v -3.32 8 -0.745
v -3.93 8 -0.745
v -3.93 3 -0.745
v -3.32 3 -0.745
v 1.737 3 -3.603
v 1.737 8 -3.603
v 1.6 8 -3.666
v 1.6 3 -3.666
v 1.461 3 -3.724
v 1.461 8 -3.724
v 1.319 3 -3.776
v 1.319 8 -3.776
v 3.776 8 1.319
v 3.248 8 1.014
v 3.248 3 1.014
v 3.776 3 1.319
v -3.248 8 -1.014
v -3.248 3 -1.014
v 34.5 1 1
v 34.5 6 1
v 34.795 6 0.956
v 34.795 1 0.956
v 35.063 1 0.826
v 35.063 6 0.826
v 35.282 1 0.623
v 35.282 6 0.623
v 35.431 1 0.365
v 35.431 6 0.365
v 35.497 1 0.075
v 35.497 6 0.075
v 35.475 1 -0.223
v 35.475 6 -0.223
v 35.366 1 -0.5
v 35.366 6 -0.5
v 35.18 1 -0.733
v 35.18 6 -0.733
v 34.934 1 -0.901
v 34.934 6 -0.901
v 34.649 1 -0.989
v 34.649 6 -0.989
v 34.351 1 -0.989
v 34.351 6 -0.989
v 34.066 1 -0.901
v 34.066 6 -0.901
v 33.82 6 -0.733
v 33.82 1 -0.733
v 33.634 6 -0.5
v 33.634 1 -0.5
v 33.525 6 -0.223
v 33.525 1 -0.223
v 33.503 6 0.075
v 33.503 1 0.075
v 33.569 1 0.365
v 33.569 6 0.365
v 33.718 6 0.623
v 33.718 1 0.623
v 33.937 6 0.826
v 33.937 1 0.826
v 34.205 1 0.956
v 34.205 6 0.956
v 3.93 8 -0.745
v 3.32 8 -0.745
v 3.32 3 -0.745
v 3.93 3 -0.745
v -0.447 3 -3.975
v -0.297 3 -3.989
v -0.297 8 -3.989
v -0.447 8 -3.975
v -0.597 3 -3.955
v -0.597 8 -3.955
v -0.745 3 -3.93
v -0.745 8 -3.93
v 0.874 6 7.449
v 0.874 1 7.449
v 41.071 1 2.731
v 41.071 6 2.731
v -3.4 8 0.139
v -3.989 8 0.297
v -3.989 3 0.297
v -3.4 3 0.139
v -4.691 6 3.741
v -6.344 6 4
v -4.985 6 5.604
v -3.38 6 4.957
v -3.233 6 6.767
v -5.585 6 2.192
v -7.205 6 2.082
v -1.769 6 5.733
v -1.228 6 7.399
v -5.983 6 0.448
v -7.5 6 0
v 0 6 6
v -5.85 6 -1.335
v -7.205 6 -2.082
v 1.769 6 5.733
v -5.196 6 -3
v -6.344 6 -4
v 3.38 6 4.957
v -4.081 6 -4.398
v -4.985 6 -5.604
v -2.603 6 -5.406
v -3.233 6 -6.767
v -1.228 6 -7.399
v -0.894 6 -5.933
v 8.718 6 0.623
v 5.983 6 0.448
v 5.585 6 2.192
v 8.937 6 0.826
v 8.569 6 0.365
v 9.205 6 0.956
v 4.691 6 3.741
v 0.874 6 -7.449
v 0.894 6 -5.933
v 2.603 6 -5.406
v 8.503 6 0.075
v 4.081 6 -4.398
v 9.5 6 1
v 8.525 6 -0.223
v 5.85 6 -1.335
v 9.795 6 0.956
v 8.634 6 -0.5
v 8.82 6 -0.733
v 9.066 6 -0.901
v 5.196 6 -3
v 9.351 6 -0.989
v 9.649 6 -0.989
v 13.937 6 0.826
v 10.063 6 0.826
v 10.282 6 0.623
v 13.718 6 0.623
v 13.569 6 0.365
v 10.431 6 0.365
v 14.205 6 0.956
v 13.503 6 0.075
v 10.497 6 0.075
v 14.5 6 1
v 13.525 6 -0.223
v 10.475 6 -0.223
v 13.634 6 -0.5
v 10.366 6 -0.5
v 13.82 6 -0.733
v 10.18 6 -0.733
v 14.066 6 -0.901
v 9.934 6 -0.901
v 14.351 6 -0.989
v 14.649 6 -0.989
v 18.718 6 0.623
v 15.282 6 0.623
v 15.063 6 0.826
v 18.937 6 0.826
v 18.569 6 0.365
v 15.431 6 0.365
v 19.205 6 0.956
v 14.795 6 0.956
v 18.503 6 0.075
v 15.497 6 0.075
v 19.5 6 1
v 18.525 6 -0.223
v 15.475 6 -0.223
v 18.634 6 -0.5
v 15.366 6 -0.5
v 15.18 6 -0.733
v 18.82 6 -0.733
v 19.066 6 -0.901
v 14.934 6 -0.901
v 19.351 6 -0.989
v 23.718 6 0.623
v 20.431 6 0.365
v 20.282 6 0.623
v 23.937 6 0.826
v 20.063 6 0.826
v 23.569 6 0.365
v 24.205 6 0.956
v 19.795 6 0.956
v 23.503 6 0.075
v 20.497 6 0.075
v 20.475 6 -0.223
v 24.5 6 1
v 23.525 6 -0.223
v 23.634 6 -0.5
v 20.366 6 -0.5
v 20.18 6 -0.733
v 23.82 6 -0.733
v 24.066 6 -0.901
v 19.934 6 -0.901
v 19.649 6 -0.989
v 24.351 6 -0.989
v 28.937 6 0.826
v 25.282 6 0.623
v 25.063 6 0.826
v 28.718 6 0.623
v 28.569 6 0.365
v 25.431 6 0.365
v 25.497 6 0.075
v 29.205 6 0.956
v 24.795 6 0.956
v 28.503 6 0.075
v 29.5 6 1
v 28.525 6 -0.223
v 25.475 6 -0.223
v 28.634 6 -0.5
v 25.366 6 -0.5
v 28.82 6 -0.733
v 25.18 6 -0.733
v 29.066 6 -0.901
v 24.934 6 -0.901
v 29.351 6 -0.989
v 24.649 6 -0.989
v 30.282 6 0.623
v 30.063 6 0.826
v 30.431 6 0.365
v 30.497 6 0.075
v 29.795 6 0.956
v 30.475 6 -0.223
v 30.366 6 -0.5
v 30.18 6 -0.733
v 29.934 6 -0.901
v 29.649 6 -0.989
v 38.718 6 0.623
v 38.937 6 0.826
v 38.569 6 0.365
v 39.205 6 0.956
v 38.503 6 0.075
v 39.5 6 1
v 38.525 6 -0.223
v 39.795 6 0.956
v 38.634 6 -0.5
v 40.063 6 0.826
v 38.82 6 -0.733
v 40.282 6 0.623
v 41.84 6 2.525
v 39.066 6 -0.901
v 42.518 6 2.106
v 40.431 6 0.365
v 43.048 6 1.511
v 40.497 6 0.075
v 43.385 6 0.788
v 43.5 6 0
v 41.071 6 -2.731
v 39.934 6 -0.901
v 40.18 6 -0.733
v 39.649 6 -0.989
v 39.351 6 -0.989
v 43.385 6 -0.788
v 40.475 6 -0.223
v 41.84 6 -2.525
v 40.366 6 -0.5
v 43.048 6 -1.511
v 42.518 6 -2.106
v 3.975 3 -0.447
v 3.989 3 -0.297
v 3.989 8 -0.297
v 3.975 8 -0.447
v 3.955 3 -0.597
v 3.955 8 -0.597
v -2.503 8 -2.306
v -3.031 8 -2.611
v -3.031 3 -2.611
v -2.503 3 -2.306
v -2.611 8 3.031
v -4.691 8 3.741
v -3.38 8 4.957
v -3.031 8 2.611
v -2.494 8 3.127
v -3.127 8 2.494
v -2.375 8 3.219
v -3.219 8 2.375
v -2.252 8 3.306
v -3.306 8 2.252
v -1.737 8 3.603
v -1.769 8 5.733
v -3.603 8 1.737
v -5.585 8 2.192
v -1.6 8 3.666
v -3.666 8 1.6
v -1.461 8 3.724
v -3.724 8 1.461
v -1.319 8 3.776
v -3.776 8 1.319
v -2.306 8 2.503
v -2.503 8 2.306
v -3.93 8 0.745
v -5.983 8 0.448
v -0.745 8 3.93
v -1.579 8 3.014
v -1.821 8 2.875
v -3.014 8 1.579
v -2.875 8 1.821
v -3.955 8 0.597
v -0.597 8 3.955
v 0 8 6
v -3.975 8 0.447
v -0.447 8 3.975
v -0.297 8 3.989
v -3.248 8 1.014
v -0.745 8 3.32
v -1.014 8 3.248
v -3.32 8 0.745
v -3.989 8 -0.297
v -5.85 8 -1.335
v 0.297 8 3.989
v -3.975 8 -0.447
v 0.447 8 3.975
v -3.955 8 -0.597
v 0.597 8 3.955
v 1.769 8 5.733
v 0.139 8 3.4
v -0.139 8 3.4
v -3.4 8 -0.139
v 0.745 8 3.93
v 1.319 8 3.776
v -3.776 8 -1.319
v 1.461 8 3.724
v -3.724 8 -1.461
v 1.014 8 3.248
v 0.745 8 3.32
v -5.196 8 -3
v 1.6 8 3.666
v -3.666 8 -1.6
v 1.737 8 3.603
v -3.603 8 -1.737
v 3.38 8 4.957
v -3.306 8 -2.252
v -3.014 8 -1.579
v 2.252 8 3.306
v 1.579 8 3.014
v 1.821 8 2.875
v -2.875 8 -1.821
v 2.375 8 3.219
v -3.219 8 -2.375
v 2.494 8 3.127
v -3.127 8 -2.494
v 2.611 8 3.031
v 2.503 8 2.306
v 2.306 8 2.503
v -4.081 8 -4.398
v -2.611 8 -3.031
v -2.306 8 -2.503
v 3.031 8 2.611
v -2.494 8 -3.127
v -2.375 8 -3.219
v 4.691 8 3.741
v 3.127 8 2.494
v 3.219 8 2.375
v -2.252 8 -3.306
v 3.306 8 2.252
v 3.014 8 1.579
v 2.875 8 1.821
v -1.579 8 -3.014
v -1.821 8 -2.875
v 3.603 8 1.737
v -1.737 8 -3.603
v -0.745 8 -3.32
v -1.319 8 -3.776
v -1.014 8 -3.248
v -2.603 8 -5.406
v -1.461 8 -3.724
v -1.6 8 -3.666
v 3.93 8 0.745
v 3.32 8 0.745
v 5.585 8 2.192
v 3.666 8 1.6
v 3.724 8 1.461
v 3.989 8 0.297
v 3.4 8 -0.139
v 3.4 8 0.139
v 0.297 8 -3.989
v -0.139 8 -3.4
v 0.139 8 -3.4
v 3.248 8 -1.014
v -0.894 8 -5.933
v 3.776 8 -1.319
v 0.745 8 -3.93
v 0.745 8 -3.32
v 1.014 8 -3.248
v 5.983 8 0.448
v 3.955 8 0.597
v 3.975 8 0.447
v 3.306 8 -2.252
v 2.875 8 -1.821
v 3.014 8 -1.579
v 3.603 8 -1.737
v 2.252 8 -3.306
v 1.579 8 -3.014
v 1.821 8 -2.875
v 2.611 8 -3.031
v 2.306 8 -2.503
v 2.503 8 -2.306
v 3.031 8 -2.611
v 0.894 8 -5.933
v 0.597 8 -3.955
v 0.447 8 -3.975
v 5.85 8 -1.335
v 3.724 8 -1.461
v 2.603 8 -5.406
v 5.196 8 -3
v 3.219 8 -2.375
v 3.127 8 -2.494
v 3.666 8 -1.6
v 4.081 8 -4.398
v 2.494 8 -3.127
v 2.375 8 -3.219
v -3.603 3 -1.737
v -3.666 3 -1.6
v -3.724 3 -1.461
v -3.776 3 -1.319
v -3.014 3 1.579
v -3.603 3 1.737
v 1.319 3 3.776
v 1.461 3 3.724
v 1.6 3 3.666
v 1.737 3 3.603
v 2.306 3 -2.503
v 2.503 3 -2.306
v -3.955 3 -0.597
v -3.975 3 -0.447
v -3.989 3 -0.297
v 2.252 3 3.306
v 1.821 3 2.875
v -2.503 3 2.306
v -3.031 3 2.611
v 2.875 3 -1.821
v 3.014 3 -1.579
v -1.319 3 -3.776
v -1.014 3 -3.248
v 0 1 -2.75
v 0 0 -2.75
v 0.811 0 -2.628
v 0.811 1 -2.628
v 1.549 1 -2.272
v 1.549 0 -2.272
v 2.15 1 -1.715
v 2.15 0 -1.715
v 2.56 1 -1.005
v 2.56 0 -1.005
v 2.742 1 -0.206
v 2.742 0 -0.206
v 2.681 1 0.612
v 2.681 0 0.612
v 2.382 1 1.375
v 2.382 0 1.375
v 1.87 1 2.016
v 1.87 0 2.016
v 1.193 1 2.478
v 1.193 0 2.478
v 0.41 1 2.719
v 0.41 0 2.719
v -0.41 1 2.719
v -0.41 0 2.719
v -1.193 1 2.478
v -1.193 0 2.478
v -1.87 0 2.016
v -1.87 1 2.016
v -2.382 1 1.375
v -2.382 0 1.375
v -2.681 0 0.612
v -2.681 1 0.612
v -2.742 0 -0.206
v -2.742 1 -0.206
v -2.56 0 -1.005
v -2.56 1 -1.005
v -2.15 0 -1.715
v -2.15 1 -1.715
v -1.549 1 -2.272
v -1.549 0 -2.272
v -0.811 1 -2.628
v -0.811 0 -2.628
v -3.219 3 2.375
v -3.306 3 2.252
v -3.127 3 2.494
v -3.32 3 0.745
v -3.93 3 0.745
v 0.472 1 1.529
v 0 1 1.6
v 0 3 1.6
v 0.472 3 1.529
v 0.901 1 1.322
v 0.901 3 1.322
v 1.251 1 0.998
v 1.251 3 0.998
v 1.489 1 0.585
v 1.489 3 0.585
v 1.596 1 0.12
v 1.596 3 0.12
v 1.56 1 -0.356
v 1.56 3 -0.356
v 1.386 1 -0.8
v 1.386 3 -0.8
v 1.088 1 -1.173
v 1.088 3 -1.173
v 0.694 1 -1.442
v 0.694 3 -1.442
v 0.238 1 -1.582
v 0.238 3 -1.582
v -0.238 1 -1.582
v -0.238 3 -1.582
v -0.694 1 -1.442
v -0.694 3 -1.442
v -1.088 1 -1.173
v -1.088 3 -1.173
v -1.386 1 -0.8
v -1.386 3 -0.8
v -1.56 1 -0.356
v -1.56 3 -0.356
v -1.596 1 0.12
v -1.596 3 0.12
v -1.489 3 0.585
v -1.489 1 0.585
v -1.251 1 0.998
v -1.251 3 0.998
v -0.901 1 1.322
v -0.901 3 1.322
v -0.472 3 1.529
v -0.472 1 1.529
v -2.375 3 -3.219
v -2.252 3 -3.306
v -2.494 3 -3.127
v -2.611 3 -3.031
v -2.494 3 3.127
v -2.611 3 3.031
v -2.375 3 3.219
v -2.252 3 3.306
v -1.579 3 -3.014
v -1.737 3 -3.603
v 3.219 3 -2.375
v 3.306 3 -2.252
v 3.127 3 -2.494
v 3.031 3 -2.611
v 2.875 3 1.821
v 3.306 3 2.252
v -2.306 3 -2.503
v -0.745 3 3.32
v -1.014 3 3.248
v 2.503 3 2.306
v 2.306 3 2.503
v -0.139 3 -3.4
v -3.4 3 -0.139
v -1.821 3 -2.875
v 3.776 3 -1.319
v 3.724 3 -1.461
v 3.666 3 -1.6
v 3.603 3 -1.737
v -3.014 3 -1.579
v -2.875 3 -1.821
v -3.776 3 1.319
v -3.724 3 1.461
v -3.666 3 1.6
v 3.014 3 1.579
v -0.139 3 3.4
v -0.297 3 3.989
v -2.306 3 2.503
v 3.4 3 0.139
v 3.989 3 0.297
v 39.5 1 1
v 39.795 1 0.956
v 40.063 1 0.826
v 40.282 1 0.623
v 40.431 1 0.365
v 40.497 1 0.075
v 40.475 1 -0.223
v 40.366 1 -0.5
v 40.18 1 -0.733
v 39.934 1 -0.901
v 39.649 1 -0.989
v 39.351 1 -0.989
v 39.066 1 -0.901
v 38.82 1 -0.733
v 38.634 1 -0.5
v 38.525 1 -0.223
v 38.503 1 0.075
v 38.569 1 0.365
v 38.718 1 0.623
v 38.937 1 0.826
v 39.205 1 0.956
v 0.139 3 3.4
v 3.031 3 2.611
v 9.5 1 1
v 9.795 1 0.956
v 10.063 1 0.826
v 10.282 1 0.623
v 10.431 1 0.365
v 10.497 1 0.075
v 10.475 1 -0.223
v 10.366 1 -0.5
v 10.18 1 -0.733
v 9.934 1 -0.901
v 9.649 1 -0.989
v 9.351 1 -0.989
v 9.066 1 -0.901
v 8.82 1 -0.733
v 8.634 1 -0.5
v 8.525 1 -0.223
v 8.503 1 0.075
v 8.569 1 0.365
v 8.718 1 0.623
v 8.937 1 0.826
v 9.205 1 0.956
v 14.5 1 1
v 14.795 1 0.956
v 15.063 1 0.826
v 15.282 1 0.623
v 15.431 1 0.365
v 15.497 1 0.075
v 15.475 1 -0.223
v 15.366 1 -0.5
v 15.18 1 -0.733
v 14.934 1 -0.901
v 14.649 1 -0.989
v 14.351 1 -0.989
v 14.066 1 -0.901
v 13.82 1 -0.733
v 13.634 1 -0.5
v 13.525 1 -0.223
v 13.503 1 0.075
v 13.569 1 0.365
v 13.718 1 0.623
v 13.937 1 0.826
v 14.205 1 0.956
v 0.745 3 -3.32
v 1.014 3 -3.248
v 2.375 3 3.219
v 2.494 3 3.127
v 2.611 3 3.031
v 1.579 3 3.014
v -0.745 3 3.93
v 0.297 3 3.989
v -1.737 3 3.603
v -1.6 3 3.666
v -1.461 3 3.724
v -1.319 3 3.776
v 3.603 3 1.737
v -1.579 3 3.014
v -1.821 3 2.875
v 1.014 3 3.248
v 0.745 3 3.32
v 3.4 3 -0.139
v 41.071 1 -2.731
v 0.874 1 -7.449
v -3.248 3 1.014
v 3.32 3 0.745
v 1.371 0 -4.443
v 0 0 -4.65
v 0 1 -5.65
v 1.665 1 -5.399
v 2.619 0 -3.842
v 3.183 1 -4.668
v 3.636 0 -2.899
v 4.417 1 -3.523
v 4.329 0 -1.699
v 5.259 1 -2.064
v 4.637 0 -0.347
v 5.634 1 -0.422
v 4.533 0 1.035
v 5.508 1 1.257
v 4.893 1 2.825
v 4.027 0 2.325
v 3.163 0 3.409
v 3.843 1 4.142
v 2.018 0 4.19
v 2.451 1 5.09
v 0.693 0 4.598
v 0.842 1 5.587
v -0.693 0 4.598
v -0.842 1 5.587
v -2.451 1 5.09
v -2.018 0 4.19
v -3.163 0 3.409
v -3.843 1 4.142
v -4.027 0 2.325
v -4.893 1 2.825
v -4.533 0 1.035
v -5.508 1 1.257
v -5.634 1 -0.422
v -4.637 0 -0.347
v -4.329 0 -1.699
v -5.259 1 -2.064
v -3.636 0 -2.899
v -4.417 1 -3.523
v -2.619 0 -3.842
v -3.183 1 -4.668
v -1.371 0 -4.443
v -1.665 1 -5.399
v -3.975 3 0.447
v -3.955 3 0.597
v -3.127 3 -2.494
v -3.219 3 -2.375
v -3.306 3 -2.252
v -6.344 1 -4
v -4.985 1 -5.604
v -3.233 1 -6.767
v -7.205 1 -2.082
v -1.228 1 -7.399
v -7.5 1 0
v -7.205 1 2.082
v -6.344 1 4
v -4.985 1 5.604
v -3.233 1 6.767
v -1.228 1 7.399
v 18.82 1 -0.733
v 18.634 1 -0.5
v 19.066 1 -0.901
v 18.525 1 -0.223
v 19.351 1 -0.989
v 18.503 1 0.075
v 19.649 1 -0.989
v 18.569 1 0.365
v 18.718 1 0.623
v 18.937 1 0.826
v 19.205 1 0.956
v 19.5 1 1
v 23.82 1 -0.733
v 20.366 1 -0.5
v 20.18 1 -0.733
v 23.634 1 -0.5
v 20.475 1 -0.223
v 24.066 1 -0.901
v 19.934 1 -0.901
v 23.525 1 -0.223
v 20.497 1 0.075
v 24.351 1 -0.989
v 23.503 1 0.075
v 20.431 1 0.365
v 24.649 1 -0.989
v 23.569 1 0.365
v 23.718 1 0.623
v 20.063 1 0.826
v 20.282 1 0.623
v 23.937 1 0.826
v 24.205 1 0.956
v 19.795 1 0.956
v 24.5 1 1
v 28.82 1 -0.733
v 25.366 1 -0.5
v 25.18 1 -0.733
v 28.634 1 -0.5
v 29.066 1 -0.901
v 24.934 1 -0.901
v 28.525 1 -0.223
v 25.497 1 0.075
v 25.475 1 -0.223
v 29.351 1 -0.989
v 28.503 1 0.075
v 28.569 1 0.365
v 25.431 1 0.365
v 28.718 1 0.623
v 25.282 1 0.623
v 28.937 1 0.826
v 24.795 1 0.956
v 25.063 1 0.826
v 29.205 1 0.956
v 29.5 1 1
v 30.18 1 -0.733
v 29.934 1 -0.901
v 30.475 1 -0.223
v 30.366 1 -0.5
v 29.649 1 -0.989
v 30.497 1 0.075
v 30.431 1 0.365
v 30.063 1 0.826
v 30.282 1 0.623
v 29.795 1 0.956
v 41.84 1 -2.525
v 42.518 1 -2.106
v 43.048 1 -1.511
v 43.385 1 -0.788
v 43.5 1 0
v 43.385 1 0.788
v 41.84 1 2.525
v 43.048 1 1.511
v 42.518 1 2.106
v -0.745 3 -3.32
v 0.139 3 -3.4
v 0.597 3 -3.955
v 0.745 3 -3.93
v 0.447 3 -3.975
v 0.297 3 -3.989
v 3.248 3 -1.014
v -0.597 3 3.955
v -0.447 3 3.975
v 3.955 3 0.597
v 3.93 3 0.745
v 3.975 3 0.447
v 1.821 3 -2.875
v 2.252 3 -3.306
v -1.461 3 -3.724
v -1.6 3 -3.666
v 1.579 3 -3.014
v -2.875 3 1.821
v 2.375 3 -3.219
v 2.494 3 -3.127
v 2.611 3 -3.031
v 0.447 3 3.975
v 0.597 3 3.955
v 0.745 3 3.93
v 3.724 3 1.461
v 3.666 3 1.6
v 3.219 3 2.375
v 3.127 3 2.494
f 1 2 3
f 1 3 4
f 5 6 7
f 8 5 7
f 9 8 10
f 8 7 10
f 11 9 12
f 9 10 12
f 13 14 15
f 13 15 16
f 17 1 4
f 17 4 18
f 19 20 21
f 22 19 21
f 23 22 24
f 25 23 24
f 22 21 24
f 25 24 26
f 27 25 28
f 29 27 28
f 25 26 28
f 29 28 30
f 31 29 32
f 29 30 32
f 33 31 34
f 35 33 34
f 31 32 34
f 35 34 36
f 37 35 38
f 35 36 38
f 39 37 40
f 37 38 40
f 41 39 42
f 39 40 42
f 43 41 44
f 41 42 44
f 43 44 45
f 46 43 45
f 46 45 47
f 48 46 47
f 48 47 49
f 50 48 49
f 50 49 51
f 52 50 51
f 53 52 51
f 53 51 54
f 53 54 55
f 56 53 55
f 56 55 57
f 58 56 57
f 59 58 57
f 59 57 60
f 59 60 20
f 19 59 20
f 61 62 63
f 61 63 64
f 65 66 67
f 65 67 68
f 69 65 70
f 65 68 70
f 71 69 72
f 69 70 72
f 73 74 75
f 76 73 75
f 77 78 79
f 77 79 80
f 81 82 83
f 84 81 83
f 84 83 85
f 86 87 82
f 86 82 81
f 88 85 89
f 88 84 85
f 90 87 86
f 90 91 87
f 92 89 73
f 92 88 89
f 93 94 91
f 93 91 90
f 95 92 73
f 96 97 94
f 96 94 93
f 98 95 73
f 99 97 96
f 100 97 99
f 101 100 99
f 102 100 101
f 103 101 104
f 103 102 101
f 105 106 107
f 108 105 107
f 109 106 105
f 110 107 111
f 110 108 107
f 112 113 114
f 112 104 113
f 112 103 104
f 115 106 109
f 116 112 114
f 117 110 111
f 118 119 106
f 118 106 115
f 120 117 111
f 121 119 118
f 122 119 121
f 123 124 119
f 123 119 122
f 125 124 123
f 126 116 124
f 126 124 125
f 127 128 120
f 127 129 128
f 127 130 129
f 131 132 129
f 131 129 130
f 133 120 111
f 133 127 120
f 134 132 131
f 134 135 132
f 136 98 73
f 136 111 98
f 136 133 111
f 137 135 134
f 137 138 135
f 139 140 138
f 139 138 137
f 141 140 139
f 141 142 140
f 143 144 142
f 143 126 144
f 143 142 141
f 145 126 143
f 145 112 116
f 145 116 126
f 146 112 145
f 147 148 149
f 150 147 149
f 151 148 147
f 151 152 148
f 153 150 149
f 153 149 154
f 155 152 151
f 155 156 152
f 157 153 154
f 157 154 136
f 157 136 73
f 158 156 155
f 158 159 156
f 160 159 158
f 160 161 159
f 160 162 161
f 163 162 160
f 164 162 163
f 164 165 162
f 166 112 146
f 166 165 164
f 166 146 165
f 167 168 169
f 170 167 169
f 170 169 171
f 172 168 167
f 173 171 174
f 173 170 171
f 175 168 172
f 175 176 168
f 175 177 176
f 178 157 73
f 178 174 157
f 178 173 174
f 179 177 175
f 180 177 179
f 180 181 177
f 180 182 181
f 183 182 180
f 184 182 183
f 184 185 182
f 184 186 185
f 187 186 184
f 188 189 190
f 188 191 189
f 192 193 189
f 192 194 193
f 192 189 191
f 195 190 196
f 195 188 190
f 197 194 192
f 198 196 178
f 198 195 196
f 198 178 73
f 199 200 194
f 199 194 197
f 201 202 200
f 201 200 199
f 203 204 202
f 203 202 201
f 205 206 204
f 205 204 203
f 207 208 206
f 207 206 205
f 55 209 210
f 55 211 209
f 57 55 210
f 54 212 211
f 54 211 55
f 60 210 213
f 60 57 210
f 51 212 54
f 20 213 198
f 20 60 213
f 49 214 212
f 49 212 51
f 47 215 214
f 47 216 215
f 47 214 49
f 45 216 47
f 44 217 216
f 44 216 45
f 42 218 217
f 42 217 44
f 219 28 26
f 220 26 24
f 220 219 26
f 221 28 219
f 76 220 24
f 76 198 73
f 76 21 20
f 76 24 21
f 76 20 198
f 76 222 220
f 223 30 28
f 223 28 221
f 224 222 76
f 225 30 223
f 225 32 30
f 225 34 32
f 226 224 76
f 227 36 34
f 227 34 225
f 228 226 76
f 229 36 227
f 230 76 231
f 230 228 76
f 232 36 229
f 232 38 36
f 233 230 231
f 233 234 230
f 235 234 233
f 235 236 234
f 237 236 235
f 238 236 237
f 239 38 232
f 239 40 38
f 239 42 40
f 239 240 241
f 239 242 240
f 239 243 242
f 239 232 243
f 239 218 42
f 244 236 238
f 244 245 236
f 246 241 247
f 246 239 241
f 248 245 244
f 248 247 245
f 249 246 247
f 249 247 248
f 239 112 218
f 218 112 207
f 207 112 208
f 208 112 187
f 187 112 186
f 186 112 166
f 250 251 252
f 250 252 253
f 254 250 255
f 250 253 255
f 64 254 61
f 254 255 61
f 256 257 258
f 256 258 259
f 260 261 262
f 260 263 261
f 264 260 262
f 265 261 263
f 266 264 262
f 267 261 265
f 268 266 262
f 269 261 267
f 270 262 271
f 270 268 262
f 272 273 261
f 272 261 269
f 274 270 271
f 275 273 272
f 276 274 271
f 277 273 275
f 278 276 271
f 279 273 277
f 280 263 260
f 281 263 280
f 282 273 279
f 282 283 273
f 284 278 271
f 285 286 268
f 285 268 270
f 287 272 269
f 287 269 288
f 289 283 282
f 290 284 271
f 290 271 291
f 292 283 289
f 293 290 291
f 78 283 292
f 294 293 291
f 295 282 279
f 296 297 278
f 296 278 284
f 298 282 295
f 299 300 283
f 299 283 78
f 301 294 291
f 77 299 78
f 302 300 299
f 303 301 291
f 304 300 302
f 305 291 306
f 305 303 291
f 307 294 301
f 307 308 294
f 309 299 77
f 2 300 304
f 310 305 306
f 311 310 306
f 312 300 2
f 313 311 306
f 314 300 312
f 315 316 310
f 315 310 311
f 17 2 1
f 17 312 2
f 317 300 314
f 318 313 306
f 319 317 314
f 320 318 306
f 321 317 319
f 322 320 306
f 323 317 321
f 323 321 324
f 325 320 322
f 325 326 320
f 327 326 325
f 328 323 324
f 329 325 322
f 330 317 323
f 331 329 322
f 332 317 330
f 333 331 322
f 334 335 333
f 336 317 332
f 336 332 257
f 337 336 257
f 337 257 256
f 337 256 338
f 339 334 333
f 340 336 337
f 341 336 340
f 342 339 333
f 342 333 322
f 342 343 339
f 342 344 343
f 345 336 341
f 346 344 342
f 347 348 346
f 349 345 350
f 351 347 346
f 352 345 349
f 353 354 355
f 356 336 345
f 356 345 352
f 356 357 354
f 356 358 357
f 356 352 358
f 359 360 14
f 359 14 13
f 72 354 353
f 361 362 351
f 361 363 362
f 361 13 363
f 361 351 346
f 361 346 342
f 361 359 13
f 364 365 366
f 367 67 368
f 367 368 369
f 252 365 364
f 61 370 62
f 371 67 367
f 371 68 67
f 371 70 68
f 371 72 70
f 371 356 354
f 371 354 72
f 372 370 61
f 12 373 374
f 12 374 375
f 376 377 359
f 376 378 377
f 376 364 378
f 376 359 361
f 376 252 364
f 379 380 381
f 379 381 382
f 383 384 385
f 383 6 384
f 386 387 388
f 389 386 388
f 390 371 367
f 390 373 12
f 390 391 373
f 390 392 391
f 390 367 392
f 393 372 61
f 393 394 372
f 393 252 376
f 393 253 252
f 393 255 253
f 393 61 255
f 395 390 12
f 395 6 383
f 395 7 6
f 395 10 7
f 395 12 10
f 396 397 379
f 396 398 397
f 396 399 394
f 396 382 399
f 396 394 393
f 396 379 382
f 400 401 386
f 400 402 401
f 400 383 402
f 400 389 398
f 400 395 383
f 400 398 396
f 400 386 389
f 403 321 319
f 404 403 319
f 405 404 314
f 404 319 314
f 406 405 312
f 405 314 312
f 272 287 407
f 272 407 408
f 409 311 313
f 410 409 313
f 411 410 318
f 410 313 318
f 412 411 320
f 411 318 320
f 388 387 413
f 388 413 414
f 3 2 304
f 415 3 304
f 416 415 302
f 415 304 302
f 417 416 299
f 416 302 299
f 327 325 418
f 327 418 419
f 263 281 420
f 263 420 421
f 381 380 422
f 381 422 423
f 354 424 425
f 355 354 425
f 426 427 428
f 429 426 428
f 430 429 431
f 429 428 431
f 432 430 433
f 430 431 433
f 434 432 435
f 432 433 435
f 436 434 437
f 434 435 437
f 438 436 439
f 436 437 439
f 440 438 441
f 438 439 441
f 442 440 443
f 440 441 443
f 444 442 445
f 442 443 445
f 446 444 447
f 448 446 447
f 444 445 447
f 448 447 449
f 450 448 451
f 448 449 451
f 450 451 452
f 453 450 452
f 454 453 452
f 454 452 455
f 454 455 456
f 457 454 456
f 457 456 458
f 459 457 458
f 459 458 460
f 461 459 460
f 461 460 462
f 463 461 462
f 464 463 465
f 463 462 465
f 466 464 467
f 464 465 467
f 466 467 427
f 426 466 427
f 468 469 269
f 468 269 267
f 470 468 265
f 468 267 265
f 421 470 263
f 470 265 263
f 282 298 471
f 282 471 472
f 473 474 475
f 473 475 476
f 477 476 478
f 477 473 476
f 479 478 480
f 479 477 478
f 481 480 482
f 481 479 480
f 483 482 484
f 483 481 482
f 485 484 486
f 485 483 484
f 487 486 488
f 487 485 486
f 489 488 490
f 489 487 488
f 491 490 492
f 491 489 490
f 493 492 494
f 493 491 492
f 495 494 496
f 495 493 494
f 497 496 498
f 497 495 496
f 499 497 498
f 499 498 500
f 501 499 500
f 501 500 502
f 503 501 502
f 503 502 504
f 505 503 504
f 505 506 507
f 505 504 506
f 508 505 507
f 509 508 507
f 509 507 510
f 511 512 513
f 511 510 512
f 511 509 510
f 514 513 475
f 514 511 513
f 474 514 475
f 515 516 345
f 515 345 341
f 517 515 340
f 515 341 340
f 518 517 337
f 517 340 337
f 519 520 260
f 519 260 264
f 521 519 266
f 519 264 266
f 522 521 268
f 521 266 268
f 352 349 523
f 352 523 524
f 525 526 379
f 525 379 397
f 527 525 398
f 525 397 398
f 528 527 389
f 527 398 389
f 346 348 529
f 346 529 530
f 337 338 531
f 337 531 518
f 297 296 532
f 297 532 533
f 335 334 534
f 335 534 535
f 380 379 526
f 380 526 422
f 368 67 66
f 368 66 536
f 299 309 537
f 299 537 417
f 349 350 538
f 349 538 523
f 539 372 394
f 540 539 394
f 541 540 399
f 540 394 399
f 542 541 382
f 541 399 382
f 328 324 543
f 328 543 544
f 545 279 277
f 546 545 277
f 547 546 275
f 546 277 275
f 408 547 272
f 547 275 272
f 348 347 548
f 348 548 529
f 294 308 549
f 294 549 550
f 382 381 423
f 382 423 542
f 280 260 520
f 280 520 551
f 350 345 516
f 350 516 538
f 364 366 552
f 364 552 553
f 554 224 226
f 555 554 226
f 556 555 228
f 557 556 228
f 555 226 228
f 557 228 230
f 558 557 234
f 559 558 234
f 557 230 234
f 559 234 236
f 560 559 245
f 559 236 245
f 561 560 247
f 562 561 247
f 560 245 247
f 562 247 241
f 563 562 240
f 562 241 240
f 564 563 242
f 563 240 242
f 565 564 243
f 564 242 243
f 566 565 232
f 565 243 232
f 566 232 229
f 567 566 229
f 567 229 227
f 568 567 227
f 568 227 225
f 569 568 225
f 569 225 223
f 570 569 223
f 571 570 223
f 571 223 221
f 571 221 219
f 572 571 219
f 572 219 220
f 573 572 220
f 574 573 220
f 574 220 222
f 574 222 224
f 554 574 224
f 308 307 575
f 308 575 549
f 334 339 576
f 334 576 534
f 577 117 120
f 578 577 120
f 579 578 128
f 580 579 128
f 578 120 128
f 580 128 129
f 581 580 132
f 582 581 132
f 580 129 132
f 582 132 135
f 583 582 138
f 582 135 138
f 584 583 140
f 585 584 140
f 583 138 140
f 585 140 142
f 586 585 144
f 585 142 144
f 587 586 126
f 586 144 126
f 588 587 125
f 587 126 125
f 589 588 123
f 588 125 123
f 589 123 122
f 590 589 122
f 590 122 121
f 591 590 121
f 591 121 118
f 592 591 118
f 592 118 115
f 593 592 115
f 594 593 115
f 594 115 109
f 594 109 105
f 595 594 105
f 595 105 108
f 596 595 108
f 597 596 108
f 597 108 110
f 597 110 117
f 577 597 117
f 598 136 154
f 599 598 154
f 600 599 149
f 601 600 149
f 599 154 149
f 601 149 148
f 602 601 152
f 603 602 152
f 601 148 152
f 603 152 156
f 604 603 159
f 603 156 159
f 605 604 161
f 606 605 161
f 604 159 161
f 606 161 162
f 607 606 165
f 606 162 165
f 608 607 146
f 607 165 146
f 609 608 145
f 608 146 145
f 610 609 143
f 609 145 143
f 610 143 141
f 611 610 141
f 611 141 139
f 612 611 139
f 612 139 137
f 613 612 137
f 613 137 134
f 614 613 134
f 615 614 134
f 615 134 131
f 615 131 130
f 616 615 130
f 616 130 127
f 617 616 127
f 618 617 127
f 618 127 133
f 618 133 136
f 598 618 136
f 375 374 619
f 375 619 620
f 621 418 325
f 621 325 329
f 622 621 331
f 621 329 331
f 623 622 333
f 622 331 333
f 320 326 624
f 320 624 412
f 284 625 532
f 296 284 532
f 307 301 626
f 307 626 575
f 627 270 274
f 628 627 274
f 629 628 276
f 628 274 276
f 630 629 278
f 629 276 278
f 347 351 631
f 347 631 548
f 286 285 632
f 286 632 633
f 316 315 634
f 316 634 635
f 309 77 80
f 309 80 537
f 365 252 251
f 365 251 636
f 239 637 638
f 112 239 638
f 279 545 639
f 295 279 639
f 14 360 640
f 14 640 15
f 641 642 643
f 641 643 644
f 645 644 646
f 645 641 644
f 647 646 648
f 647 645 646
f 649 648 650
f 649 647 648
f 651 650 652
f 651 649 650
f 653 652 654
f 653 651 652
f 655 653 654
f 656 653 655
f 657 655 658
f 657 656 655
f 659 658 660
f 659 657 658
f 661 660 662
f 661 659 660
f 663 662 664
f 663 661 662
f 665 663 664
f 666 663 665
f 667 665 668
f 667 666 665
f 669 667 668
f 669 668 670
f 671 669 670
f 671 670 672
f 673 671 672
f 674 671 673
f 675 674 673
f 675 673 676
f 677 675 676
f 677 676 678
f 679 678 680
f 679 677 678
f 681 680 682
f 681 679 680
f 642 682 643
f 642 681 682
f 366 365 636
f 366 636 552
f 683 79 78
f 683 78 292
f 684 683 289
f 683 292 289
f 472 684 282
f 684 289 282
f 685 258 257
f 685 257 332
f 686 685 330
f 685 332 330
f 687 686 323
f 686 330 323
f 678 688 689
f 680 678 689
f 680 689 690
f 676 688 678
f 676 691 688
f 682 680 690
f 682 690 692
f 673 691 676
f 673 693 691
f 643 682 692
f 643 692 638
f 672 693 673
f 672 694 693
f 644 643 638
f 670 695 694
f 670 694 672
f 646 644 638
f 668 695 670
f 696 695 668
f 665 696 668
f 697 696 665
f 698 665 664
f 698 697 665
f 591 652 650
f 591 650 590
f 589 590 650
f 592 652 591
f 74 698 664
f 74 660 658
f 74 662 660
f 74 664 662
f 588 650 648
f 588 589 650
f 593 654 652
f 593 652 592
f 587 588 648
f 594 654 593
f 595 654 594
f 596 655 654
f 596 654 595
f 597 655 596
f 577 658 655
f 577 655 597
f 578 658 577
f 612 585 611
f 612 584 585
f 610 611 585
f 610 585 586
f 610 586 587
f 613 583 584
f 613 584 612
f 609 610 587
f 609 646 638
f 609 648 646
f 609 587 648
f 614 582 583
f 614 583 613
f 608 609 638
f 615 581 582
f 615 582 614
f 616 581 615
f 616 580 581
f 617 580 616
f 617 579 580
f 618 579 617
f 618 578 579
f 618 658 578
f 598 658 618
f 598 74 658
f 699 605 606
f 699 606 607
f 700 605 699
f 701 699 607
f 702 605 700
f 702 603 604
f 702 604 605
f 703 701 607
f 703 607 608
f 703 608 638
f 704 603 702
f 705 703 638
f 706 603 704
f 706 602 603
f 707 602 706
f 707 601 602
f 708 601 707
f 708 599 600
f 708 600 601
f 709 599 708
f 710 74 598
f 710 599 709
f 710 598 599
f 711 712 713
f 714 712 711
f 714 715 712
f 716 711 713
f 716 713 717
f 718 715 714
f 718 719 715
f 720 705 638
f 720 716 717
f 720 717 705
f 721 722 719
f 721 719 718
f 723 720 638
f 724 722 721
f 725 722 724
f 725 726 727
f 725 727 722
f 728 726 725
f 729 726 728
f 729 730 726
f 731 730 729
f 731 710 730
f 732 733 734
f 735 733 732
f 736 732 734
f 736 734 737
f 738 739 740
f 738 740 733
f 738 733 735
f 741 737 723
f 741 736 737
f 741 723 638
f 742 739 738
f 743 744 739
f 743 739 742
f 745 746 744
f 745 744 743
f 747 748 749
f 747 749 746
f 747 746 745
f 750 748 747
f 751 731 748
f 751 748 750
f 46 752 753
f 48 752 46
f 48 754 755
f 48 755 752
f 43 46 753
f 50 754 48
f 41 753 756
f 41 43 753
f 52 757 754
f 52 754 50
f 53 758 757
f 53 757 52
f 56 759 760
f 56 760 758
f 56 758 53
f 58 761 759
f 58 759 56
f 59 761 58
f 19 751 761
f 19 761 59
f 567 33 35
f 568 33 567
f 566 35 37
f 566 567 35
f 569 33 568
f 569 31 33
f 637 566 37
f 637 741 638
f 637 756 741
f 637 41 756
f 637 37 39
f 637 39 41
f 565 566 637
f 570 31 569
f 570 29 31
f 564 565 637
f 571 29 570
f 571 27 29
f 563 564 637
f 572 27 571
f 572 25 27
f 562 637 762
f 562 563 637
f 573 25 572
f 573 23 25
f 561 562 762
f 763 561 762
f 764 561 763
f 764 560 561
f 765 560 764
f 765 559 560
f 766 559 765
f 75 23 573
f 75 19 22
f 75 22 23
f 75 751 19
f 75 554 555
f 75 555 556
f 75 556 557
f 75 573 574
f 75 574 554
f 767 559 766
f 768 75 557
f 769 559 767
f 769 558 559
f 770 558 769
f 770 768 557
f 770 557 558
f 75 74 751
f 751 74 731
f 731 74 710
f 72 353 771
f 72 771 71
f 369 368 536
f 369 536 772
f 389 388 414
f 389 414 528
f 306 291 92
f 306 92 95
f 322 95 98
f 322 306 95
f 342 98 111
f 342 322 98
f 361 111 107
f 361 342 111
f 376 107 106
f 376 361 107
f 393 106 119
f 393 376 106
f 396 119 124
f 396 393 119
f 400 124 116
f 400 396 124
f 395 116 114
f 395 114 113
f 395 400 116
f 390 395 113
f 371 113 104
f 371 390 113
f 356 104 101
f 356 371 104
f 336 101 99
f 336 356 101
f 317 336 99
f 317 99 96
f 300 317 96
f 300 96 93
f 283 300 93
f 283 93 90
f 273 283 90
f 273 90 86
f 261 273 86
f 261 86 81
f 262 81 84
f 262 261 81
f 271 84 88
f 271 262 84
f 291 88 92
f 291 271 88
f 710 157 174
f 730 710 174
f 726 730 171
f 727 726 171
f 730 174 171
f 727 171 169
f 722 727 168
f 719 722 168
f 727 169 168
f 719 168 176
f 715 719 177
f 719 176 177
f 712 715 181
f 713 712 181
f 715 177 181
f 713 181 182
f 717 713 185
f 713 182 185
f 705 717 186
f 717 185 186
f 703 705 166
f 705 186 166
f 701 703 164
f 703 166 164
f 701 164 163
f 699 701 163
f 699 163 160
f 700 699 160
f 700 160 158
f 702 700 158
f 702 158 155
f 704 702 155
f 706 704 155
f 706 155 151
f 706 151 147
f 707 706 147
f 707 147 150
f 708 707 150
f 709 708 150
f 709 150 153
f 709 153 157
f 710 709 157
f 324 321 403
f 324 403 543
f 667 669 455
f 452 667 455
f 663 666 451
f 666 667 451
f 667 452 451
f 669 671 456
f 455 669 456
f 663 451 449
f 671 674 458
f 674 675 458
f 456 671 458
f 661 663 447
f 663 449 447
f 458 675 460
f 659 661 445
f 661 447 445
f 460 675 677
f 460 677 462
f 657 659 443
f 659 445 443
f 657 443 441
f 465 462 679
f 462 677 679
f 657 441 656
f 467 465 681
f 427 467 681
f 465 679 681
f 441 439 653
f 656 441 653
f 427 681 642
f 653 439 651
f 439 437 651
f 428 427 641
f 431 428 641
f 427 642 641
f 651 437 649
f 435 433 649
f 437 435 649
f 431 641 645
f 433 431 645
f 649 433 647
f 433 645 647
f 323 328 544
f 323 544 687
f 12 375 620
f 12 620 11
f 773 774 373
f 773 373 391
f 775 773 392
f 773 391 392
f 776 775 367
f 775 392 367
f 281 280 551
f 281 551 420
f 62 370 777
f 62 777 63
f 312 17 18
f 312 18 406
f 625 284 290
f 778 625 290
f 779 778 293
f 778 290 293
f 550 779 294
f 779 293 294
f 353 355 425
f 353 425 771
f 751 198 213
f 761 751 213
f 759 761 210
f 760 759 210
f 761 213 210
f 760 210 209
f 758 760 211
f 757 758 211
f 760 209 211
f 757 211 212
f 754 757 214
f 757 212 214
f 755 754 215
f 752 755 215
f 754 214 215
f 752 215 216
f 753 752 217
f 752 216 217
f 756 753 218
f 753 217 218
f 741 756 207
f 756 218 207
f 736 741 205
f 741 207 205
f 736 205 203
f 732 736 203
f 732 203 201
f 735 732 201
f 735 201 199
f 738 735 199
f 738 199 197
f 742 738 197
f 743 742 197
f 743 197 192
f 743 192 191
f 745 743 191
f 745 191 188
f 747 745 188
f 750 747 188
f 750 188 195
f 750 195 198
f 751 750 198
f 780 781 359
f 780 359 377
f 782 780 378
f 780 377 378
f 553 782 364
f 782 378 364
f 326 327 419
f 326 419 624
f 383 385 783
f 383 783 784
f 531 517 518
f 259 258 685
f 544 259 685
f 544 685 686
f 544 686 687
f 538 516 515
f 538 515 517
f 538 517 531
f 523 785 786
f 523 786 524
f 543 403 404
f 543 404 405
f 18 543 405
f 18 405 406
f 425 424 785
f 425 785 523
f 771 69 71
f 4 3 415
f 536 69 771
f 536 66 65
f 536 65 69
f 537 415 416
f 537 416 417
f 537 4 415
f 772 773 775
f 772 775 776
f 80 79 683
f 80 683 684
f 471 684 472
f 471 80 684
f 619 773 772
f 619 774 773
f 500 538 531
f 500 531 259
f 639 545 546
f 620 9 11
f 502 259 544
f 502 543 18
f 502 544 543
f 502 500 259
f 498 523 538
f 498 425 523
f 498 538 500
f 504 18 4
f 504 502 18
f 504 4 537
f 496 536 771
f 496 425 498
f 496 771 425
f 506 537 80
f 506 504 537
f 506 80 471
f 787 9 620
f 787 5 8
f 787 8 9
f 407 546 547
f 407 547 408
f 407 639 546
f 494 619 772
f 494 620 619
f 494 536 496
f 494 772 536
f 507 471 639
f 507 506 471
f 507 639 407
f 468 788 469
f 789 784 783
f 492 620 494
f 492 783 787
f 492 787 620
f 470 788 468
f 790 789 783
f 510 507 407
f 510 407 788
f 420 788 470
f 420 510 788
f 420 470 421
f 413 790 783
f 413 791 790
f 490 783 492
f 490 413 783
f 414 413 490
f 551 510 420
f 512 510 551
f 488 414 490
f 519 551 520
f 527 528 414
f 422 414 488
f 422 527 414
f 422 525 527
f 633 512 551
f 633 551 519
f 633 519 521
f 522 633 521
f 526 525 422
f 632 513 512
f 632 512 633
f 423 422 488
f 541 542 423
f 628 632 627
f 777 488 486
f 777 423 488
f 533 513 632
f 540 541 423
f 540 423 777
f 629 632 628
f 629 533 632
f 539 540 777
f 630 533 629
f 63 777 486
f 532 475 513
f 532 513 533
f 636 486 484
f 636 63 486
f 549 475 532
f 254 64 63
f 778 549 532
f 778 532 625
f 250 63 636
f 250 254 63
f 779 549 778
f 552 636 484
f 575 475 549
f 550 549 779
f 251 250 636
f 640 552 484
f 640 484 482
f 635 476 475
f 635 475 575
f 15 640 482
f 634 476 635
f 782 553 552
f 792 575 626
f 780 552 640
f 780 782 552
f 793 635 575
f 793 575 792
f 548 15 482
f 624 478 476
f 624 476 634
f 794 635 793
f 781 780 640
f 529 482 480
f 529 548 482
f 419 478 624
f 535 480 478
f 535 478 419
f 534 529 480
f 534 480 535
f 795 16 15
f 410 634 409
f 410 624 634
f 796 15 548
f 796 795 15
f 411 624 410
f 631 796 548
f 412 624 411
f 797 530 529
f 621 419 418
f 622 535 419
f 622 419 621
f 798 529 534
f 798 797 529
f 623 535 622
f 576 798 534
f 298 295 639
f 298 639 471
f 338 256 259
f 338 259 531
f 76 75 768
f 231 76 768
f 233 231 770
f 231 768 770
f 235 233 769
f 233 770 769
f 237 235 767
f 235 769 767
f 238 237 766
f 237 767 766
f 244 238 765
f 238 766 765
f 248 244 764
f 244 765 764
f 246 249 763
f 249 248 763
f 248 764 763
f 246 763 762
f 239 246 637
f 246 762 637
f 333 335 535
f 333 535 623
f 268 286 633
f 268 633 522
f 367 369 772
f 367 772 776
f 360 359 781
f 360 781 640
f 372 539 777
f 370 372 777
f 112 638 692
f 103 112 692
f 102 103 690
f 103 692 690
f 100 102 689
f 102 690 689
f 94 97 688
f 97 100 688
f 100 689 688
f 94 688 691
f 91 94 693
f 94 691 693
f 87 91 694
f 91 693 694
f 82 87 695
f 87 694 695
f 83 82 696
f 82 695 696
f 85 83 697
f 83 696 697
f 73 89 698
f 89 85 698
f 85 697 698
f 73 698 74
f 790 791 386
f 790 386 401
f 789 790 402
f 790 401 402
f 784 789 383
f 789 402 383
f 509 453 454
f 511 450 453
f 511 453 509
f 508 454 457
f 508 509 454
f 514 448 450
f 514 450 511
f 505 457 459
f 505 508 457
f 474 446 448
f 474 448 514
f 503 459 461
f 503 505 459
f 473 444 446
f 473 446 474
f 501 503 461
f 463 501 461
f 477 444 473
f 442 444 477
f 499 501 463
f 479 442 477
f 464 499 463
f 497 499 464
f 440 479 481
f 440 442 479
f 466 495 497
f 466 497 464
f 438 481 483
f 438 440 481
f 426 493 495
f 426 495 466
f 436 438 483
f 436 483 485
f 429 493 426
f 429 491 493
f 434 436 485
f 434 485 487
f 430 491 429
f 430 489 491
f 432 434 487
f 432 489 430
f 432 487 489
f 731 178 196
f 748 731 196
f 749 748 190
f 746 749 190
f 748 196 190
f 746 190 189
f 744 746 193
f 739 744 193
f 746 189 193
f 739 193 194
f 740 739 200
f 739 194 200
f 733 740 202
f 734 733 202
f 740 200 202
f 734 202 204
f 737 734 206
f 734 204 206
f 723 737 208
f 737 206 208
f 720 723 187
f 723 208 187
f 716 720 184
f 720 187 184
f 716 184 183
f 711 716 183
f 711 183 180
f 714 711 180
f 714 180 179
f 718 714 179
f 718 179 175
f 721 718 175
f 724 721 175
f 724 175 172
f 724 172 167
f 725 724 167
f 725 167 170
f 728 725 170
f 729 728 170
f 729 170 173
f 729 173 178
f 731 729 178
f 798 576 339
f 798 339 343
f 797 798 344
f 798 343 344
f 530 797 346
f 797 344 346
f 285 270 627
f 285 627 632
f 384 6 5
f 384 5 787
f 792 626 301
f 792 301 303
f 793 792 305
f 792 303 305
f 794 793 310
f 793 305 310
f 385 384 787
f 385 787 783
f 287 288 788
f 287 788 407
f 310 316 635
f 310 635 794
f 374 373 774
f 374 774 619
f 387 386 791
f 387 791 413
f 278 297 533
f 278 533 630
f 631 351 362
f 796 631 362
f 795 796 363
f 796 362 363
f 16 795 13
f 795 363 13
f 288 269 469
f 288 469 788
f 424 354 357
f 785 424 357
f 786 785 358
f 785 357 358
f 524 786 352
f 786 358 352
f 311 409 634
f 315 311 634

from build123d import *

# Parameters (mm, degrees)
ESQUISSE1_R                  = 1.6
BOSS_EXTRU_1_DEPTH           = 8
ESQUISSE2_R                  = 1
ENL_V_MAT_EXTRU_1_DEPTH      = 8
R_P_TITION_LIN_AIRE1_COUNT   = 7
R_P_TITION_LIN_AIRE1_PITCH   = 5
ESQUISSE3_W                  = 63.02569825
ESQUISSE3_H                  = 22.447508966
ESQUISSE3_R                  = 6
ENL_V_MAT_EXTRU_2_DEPTH      = 2
ESQUISSE4_W                  = 65.150237544
ESQUISSE4_H                  = 23.585889013
ESQUISSE4_R                  = 4.65
ENL_V_MAT_EXTRU_3_DEPTH      = 1
ESQUISSE5_R                  = 2.75
ENL_V_MAT_EXTRU_4_DEPTH      = 1
CHANFREIN1_SIZE              = 1
ESQUISSE6_R                  = 4
ENL_V_MAT_EXTRU_5_DEPTH      = 5
BOSS_EXTRU_2_DEPTH           = 5
R_P_TITION_CIRCULAIRE1_COUNT = 24


with BuildPart() as part:
    # Esquisse1 → Boss.-Extru.1 (new body)
    with BuildSketch(Plane(origin=(0, 0, 0), x_dir=(1, 0, 0), z_dir=(0, 1, 0))):
        with BuildLine():
            Line((0.874233129, -7.448873501), (41.070552147, -2.731253617))
            ThreePointArc((41.070552147, -2.731253617), (43.5, 0), (41.070552147, 2.731253617))
            Line((41.070552147, 2.731253617), (0.874233129, 7.448873501))
            ThreePointArc((0.874233129, 7.448873501), (-7.5, 0), (0.874233129, -7.448873501))
        make_face()
        with Locations(Location((0, 0, 0), (0, 0, 270))):
            Circle(ESQUISSE1_R, mode=Mode.SUBTRACT)
    extrude(amount=BOSS_EXTRU_1_DEPTH)

    # Esquisse2 → Enlèv. mat.-Extru.1 (cut)
    with BuildSketch(Plane(origin=(0, 8, 0), x_dir=(1, 0, 0), z_dir=(0, 1, 0))):
        with Locations(Location((9.5, 0, 0), (0, 0, 270))):
            Circle(ESQUISSE2_R)
    enl_v_mat_extru_1 = extrude(amount=-ENL_V_MAT_EXTRU_1_DEPTH, mode=Mode.SUBTRACT)

    # Répétition linéaire1: Enlèv. mat.-Extru.1 ×7
    with Locations(*[(i * R_P_TITION_LIN_AIRE1_PITCH, 0, 0) for i in range(1, R_P_TITION_LIN_AIRE1_COUNT)]):
        add(enl_v_mat_extru_1, mode=Mode.SUBTRACT)

    # Esquisse3 → Enlèv. mat.-Extru.2 (cut)
    with BuildSketch(Plane(origin=(0, 8, 0), x_dir=(1, 0, 0), z_dir=(0, 1, 0))):
        with Locations((18.729808022, -1.006570064)):
            Rectangle(ESQUISSE3_W, ESQUISSE3_H)
        with Locations(Location((0, 0, 0), (0, 0, 270))):
            Circle(ESQUISSE3_R, mode=Mode.SUBTRACT)
    extrude(amount=-ENL_V_MAT_EXTRU_2_DEPTH, mode=Mode.SUBTRACT)

    # Esquisse4 → Enlèv. mat.-Extru.3 (cut)
    with BuildSketch(Plane.XZ):
        with Locations((19.098187779, 0.565848797)):
            Rectangle(ESQUISSE4_W, ESQUISSE4_H)
        with Locations(Location((0, 0, 0), (0, 0, 270))):
            Circle(ESQUISSE4_R, mode=Mode.SUBTRACT)
    extrude(amount=-ENL_V_MAT_EXTRU_3_DEPTH, mode=Mode.SUBTRACT)

    # Esquisse5 → Enlèv. mat.-Extru.4 (cut)
    with BuildSketch(Plane.XZ):
        with Locations(Location((0, 0, 0), (0, 0, 270))):
            Circle(ESQUISSE5_R)
    extrude(amount=-ENL_V_MAT_EXTRU_4_DEPTH, mode=Mode.SUBTRACT)

    # Chanfrein1
    chanfrein1_edges = [part.edges().sort_by_distance(p)[0] for p in [
        (0, 1, 4.65),
    ]]
    chamfer(chanfrein1_edges, length=CHANFREIN1_SIZE - 0.0001)  # a hair under: the kernel refuses the full size

    # Esquisse6 → Enlèv. mat.-Extru.5 (cut)
    with BuildSketch(Plane(origin=(0, 8, 0), x_dir=(1, 0, 0), z_dir=(0, 1, 0))):
        with Locations(Location((0, 0, 0), (0, 0, 270))):
            Circle(ESQUISSE6_R)
    extrude(amount=-ENL_V_MAT_EXTRU_5_DEPTH, mode=Mode.SUBTRACT)

    # Esquisse7 → Boss.-Extru.2 (add)
    with BuildSketch(Plane(origin=(0, 8, 0), x_dir=(1, 0, 0), z_dir=(0, 1, 0))):
        Polygon((0.3, -4), (0.139230485, -3.4), (-0.139230485, -3.4), (-0.3, -4), align=None)
    boss_extru_2 = extrude(amount=-BOSS_EXTRU_2_DEPTH)

    # Répétition circulaire1: Boss.-Extru.2 ×24 about axis
    r_p_tition_circulaire1_axis = Axis((0, 0, 0), (0, 1, 0))
    for i in range(1, R_P_TITION_CIRCULAIRE1_COUNT):
        add(boss_extru_2.rotate(r_p_tition_circulaire1_axis, i * 360 / R_P_TITION_CIRCULAIRE1_COUNT))


solid = part.part
